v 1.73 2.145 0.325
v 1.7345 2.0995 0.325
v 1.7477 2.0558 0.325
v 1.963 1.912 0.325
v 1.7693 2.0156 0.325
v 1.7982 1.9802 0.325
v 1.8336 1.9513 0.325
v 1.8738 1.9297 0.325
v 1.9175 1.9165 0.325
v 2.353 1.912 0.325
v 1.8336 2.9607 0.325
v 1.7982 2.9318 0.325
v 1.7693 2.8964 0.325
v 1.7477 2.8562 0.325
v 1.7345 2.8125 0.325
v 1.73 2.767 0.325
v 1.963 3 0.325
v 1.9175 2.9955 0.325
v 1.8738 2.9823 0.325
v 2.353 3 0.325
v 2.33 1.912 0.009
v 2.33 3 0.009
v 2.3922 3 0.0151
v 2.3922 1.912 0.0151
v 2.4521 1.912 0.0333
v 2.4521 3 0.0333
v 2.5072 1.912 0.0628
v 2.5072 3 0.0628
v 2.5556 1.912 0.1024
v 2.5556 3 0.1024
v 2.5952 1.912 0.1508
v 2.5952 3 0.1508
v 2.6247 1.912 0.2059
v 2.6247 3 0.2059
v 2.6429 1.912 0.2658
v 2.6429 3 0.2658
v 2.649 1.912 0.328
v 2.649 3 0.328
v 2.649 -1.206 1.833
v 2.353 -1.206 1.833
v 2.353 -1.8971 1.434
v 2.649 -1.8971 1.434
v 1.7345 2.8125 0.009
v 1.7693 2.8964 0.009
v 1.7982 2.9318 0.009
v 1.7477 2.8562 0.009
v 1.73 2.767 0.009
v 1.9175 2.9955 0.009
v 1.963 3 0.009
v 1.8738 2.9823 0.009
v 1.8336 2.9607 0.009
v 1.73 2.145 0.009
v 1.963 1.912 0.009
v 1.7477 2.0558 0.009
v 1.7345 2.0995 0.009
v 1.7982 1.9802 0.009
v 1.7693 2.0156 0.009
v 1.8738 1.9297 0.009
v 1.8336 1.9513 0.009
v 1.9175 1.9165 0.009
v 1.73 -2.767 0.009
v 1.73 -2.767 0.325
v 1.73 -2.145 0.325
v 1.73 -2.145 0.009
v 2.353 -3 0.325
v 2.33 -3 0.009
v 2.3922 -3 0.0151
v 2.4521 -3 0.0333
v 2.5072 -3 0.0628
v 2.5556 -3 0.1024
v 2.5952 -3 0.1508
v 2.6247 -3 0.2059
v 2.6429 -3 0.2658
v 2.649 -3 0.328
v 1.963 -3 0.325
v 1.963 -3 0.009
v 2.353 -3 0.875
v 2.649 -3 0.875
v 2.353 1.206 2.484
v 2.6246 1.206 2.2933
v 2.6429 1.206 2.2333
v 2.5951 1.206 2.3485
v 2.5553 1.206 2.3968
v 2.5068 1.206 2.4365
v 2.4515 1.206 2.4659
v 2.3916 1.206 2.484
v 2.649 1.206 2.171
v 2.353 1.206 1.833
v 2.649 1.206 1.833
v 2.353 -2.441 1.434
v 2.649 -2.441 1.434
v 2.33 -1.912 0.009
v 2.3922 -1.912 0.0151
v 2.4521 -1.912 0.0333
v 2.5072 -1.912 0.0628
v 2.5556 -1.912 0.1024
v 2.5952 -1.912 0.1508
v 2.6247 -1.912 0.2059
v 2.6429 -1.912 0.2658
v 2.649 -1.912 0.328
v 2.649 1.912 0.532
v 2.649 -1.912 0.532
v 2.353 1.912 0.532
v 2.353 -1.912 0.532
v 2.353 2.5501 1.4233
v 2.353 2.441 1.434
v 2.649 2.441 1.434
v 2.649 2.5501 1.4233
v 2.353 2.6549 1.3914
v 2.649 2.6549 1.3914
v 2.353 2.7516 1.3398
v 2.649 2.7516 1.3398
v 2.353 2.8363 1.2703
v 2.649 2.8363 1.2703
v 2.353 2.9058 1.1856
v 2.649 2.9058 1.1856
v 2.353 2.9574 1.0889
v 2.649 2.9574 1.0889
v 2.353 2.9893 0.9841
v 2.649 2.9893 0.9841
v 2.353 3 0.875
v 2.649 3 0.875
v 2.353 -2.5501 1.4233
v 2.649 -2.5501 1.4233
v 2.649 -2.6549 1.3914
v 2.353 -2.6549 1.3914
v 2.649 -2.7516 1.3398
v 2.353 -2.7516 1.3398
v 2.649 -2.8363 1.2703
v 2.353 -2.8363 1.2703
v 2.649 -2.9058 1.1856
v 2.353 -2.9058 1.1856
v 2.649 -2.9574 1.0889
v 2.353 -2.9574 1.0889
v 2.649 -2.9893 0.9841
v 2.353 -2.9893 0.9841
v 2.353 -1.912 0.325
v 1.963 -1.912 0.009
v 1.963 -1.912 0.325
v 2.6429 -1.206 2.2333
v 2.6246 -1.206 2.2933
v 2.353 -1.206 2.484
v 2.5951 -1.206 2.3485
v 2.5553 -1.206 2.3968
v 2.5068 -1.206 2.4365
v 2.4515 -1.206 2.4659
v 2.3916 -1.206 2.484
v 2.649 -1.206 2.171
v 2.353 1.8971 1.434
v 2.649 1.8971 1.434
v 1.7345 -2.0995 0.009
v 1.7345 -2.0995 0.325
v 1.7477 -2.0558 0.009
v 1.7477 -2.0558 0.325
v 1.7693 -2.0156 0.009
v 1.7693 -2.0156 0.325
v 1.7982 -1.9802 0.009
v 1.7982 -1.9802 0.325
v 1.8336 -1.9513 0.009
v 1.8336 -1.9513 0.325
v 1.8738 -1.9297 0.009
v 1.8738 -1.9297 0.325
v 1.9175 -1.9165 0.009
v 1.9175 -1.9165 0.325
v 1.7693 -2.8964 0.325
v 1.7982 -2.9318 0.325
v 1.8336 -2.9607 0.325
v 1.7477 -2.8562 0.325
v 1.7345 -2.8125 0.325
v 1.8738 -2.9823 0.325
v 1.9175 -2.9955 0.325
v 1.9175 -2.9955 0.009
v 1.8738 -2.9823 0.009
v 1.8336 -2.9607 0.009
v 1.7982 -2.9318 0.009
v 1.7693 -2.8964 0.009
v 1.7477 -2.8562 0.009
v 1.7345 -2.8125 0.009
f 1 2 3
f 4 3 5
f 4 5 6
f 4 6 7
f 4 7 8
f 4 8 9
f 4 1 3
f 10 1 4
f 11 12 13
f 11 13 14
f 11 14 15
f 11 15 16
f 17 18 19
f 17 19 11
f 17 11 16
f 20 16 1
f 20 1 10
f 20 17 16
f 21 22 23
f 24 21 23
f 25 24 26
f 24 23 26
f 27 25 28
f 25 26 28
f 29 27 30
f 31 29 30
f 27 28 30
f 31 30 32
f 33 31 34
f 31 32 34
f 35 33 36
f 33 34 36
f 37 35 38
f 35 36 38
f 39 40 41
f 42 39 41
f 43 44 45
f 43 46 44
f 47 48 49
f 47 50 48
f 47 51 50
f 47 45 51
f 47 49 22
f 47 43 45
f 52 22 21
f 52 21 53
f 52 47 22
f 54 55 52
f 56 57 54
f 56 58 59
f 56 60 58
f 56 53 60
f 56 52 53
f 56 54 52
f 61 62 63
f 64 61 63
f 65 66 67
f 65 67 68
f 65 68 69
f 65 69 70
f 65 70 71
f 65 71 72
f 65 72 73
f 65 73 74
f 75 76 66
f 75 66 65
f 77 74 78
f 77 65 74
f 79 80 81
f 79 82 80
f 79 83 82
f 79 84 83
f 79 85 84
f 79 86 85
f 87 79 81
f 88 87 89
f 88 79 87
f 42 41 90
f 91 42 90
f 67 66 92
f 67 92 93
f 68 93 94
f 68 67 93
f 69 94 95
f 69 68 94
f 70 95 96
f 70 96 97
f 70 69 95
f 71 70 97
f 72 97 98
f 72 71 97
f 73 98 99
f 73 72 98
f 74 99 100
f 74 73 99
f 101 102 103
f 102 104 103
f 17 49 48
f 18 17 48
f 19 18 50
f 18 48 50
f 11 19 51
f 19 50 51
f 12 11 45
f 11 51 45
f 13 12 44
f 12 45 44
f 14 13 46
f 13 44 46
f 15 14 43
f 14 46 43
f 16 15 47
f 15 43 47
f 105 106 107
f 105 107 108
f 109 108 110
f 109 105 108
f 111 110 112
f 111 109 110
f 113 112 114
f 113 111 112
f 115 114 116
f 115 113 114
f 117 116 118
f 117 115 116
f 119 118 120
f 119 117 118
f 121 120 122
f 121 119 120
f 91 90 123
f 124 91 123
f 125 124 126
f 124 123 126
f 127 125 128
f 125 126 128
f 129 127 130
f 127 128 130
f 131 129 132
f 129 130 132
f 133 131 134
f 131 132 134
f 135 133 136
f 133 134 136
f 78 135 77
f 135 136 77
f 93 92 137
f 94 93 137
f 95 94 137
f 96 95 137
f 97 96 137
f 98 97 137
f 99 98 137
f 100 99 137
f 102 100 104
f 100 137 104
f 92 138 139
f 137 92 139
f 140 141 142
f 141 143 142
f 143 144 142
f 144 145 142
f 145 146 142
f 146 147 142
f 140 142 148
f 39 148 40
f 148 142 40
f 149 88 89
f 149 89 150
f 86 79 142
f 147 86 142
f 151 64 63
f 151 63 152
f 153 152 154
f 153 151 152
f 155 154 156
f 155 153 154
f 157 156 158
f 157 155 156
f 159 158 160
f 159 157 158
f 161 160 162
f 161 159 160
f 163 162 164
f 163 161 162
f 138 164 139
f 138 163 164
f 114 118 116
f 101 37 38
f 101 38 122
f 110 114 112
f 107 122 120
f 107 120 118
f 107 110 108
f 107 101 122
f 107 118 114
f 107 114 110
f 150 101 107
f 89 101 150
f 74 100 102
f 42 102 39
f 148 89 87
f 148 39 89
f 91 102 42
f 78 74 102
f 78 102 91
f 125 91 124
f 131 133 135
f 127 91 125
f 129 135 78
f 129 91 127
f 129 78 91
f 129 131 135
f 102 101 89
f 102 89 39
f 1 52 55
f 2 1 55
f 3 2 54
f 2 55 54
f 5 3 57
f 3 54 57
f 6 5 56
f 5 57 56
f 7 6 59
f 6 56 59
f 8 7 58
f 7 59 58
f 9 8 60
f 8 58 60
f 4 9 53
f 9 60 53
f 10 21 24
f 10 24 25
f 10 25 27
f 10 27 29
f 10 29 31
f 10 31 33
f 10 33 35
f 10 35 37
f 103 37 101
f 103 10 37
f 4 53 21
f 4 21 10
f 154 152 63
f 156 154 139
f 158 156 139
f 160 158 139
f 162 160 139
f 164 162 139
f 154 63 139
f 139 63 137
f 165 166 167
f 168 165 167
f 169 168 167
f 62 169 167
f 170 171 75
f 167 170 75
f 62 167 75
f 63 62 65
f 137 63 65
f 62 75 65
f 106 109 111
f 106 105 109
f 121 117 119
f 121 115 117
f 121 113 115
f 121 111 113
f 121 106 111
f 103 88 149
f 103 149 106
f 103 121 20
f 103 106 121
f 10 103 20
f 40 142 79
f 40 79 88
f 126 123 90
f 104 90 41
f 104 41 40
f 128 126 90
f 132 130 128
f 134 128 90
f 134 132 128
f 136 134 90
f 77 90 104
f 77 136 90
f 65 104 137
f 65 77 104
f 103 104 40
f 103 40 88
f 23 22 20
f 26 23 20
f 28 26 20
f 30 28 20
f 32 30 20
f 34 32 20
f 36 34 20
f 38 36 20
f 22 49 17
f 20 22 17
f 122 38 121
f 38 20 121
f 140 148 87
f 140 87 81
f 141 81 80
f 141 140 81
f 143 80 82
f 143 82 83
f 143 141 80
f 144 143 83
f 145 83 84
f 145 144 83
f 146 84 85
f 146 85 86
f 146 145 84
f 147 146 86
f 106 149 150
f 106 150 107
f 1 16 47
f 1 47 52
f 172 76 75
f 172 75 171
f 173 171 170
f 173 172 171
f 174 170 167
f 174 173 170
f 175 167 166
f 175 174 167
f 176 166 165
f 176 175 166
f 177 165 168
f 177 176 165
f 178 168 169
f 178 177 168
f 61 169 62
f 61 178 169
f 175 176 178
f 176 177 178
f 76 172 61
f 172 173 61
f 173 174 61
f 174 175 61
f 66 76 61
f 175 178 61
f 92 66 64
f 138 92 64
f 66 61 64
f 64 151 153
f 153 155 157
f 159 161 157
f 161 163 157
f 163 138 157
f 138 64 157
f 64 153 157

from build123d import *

# Parameters (mm, degrees)
PAD012_DEPTH    = 0.92
POCKET011_DEPTH = 3.005
SKETCH026_W     = 2.22
SKETCH026_H     = 0.623
POCKET012_DEPTH = 3.005
POCKET013_DEPTH = 2.476


with BuildPart() as pocket013:
    # Sketch024 → Pad012 (new body)
    with BuildSketch(Plane(origin=(1.7300000817, 0.0040000316, 0.008999639), x_dir=(0, 1, 0), z_dir=(1, 0, 0))):
        with BuildLine():
            Line((-3.004, 0), (-1.916, 0))
            Line((-1.916, 0), (-1.916, 0.523))
            Line((-1.916, 0.523), (0, 0.523))
            Line((0, 0.523), (0, 2.475))
            Line((0, 2.475), (-1.21, 2.475))
            Line((-1.21, 2.475), (-1.21, 1.824))
            Line((-1.21, 1.824), (-1.9010882722, 1.425))
            Line((-1.9010882722, 1.425), (-2.445, 1.425))
            ThreePointArc((-2.445, 1.425), (-2.8402726907, 1.2612726907), (-3.004, 0.866))
            Line((-3.004, 0), (-3.004, 0.866))
        make_face()
    extrude(amount=PAD012_DEPTH)

    # Sketch025 (on Face10 of Pad012) → Pocket011 (cut, through all)
    with BuildSketch(Plane(origin=(1.7300000817, -2.9999999684, 0.008999639), x_dir=(0, 0, -1), z_dir=(0, -1, 0))):
        with BuildLine():
            ThreePointArc((0, 0.6), (-0.0934329368, 0.8255670632), (-0.319, 0.919))
            Line((-0.319, 0.919), (-2.162, 0.919))
            ThreePointArc((-2.162, 0.919), (-2.3875670632, 0.8255670632), (-2.481, 0.6))
            Line((-2.481, 0.6), (-2.481, 0.979))
            Line((-2.481, 0.979), (0, 0.979))
            Line((0, 0.979), (0, 0.6))
        make_face()
    extrude(amount=-POCKET011_DEPTH, mode=Mode.SUBTRACT)

    # Sketch026 (on Face5 of Pocket011) → Pocket012 (cut, through all)
    with BuildSketch(Plane(origin=(1.7300000817, -2.9999999684, 0.008999639), x_dir=(0, 0, -1), z_dir=(0, -1, 0))):
        with Locations((-1.426, 0.3115)):
            Rectangle(SKETCH026_W, SKETCH026_H)
    extrude(amount=-POCKET012_DEPTH, mode=Mode.SUBTRACT)

    # Sketch027 (on Face1 of Pocket012) → Pocket013 (cut, through all)
    with BuildSketch(Plane(origin=(1.7300000817, 0.0040000316, 0.008999639), x_dir=(0, 1, 0), z_dir=(0, 0, -1))):
        with BuildLine():
            Line((-3.004, -0.06), (-1.916, -0.06))
            Line((-1.916, 0.233), (-1.916, -0.06))
            ThreePointArc((-2.149, 0), (-1.98424412, 0.06824412), (-1.916, 0.233))
            Line((-2.771, 0), (-2.149, 0))
            ThreePointArc((-3.004, 0.233), (-2.93575588, 0.06824412), (-2.771, 0))
            Line((-3.004, 0.233), (-3.004, -0.06))
        make_face()
    extrude(amount=-POCKET013_DEPTH, mode=Mode.SUBTRACT)


with BuildPart() as fusion:
    # Part__Mirroring005: instance of Pocket013
    add(pocket013.part.mirror(Plane(origin=(0, 0, 0), x_dir=(1, 0, 0), z_dir=(0, 1, 0))))

    # Fusion: union Pocket013
    add(pocket013.part)


solid = fusion.part
